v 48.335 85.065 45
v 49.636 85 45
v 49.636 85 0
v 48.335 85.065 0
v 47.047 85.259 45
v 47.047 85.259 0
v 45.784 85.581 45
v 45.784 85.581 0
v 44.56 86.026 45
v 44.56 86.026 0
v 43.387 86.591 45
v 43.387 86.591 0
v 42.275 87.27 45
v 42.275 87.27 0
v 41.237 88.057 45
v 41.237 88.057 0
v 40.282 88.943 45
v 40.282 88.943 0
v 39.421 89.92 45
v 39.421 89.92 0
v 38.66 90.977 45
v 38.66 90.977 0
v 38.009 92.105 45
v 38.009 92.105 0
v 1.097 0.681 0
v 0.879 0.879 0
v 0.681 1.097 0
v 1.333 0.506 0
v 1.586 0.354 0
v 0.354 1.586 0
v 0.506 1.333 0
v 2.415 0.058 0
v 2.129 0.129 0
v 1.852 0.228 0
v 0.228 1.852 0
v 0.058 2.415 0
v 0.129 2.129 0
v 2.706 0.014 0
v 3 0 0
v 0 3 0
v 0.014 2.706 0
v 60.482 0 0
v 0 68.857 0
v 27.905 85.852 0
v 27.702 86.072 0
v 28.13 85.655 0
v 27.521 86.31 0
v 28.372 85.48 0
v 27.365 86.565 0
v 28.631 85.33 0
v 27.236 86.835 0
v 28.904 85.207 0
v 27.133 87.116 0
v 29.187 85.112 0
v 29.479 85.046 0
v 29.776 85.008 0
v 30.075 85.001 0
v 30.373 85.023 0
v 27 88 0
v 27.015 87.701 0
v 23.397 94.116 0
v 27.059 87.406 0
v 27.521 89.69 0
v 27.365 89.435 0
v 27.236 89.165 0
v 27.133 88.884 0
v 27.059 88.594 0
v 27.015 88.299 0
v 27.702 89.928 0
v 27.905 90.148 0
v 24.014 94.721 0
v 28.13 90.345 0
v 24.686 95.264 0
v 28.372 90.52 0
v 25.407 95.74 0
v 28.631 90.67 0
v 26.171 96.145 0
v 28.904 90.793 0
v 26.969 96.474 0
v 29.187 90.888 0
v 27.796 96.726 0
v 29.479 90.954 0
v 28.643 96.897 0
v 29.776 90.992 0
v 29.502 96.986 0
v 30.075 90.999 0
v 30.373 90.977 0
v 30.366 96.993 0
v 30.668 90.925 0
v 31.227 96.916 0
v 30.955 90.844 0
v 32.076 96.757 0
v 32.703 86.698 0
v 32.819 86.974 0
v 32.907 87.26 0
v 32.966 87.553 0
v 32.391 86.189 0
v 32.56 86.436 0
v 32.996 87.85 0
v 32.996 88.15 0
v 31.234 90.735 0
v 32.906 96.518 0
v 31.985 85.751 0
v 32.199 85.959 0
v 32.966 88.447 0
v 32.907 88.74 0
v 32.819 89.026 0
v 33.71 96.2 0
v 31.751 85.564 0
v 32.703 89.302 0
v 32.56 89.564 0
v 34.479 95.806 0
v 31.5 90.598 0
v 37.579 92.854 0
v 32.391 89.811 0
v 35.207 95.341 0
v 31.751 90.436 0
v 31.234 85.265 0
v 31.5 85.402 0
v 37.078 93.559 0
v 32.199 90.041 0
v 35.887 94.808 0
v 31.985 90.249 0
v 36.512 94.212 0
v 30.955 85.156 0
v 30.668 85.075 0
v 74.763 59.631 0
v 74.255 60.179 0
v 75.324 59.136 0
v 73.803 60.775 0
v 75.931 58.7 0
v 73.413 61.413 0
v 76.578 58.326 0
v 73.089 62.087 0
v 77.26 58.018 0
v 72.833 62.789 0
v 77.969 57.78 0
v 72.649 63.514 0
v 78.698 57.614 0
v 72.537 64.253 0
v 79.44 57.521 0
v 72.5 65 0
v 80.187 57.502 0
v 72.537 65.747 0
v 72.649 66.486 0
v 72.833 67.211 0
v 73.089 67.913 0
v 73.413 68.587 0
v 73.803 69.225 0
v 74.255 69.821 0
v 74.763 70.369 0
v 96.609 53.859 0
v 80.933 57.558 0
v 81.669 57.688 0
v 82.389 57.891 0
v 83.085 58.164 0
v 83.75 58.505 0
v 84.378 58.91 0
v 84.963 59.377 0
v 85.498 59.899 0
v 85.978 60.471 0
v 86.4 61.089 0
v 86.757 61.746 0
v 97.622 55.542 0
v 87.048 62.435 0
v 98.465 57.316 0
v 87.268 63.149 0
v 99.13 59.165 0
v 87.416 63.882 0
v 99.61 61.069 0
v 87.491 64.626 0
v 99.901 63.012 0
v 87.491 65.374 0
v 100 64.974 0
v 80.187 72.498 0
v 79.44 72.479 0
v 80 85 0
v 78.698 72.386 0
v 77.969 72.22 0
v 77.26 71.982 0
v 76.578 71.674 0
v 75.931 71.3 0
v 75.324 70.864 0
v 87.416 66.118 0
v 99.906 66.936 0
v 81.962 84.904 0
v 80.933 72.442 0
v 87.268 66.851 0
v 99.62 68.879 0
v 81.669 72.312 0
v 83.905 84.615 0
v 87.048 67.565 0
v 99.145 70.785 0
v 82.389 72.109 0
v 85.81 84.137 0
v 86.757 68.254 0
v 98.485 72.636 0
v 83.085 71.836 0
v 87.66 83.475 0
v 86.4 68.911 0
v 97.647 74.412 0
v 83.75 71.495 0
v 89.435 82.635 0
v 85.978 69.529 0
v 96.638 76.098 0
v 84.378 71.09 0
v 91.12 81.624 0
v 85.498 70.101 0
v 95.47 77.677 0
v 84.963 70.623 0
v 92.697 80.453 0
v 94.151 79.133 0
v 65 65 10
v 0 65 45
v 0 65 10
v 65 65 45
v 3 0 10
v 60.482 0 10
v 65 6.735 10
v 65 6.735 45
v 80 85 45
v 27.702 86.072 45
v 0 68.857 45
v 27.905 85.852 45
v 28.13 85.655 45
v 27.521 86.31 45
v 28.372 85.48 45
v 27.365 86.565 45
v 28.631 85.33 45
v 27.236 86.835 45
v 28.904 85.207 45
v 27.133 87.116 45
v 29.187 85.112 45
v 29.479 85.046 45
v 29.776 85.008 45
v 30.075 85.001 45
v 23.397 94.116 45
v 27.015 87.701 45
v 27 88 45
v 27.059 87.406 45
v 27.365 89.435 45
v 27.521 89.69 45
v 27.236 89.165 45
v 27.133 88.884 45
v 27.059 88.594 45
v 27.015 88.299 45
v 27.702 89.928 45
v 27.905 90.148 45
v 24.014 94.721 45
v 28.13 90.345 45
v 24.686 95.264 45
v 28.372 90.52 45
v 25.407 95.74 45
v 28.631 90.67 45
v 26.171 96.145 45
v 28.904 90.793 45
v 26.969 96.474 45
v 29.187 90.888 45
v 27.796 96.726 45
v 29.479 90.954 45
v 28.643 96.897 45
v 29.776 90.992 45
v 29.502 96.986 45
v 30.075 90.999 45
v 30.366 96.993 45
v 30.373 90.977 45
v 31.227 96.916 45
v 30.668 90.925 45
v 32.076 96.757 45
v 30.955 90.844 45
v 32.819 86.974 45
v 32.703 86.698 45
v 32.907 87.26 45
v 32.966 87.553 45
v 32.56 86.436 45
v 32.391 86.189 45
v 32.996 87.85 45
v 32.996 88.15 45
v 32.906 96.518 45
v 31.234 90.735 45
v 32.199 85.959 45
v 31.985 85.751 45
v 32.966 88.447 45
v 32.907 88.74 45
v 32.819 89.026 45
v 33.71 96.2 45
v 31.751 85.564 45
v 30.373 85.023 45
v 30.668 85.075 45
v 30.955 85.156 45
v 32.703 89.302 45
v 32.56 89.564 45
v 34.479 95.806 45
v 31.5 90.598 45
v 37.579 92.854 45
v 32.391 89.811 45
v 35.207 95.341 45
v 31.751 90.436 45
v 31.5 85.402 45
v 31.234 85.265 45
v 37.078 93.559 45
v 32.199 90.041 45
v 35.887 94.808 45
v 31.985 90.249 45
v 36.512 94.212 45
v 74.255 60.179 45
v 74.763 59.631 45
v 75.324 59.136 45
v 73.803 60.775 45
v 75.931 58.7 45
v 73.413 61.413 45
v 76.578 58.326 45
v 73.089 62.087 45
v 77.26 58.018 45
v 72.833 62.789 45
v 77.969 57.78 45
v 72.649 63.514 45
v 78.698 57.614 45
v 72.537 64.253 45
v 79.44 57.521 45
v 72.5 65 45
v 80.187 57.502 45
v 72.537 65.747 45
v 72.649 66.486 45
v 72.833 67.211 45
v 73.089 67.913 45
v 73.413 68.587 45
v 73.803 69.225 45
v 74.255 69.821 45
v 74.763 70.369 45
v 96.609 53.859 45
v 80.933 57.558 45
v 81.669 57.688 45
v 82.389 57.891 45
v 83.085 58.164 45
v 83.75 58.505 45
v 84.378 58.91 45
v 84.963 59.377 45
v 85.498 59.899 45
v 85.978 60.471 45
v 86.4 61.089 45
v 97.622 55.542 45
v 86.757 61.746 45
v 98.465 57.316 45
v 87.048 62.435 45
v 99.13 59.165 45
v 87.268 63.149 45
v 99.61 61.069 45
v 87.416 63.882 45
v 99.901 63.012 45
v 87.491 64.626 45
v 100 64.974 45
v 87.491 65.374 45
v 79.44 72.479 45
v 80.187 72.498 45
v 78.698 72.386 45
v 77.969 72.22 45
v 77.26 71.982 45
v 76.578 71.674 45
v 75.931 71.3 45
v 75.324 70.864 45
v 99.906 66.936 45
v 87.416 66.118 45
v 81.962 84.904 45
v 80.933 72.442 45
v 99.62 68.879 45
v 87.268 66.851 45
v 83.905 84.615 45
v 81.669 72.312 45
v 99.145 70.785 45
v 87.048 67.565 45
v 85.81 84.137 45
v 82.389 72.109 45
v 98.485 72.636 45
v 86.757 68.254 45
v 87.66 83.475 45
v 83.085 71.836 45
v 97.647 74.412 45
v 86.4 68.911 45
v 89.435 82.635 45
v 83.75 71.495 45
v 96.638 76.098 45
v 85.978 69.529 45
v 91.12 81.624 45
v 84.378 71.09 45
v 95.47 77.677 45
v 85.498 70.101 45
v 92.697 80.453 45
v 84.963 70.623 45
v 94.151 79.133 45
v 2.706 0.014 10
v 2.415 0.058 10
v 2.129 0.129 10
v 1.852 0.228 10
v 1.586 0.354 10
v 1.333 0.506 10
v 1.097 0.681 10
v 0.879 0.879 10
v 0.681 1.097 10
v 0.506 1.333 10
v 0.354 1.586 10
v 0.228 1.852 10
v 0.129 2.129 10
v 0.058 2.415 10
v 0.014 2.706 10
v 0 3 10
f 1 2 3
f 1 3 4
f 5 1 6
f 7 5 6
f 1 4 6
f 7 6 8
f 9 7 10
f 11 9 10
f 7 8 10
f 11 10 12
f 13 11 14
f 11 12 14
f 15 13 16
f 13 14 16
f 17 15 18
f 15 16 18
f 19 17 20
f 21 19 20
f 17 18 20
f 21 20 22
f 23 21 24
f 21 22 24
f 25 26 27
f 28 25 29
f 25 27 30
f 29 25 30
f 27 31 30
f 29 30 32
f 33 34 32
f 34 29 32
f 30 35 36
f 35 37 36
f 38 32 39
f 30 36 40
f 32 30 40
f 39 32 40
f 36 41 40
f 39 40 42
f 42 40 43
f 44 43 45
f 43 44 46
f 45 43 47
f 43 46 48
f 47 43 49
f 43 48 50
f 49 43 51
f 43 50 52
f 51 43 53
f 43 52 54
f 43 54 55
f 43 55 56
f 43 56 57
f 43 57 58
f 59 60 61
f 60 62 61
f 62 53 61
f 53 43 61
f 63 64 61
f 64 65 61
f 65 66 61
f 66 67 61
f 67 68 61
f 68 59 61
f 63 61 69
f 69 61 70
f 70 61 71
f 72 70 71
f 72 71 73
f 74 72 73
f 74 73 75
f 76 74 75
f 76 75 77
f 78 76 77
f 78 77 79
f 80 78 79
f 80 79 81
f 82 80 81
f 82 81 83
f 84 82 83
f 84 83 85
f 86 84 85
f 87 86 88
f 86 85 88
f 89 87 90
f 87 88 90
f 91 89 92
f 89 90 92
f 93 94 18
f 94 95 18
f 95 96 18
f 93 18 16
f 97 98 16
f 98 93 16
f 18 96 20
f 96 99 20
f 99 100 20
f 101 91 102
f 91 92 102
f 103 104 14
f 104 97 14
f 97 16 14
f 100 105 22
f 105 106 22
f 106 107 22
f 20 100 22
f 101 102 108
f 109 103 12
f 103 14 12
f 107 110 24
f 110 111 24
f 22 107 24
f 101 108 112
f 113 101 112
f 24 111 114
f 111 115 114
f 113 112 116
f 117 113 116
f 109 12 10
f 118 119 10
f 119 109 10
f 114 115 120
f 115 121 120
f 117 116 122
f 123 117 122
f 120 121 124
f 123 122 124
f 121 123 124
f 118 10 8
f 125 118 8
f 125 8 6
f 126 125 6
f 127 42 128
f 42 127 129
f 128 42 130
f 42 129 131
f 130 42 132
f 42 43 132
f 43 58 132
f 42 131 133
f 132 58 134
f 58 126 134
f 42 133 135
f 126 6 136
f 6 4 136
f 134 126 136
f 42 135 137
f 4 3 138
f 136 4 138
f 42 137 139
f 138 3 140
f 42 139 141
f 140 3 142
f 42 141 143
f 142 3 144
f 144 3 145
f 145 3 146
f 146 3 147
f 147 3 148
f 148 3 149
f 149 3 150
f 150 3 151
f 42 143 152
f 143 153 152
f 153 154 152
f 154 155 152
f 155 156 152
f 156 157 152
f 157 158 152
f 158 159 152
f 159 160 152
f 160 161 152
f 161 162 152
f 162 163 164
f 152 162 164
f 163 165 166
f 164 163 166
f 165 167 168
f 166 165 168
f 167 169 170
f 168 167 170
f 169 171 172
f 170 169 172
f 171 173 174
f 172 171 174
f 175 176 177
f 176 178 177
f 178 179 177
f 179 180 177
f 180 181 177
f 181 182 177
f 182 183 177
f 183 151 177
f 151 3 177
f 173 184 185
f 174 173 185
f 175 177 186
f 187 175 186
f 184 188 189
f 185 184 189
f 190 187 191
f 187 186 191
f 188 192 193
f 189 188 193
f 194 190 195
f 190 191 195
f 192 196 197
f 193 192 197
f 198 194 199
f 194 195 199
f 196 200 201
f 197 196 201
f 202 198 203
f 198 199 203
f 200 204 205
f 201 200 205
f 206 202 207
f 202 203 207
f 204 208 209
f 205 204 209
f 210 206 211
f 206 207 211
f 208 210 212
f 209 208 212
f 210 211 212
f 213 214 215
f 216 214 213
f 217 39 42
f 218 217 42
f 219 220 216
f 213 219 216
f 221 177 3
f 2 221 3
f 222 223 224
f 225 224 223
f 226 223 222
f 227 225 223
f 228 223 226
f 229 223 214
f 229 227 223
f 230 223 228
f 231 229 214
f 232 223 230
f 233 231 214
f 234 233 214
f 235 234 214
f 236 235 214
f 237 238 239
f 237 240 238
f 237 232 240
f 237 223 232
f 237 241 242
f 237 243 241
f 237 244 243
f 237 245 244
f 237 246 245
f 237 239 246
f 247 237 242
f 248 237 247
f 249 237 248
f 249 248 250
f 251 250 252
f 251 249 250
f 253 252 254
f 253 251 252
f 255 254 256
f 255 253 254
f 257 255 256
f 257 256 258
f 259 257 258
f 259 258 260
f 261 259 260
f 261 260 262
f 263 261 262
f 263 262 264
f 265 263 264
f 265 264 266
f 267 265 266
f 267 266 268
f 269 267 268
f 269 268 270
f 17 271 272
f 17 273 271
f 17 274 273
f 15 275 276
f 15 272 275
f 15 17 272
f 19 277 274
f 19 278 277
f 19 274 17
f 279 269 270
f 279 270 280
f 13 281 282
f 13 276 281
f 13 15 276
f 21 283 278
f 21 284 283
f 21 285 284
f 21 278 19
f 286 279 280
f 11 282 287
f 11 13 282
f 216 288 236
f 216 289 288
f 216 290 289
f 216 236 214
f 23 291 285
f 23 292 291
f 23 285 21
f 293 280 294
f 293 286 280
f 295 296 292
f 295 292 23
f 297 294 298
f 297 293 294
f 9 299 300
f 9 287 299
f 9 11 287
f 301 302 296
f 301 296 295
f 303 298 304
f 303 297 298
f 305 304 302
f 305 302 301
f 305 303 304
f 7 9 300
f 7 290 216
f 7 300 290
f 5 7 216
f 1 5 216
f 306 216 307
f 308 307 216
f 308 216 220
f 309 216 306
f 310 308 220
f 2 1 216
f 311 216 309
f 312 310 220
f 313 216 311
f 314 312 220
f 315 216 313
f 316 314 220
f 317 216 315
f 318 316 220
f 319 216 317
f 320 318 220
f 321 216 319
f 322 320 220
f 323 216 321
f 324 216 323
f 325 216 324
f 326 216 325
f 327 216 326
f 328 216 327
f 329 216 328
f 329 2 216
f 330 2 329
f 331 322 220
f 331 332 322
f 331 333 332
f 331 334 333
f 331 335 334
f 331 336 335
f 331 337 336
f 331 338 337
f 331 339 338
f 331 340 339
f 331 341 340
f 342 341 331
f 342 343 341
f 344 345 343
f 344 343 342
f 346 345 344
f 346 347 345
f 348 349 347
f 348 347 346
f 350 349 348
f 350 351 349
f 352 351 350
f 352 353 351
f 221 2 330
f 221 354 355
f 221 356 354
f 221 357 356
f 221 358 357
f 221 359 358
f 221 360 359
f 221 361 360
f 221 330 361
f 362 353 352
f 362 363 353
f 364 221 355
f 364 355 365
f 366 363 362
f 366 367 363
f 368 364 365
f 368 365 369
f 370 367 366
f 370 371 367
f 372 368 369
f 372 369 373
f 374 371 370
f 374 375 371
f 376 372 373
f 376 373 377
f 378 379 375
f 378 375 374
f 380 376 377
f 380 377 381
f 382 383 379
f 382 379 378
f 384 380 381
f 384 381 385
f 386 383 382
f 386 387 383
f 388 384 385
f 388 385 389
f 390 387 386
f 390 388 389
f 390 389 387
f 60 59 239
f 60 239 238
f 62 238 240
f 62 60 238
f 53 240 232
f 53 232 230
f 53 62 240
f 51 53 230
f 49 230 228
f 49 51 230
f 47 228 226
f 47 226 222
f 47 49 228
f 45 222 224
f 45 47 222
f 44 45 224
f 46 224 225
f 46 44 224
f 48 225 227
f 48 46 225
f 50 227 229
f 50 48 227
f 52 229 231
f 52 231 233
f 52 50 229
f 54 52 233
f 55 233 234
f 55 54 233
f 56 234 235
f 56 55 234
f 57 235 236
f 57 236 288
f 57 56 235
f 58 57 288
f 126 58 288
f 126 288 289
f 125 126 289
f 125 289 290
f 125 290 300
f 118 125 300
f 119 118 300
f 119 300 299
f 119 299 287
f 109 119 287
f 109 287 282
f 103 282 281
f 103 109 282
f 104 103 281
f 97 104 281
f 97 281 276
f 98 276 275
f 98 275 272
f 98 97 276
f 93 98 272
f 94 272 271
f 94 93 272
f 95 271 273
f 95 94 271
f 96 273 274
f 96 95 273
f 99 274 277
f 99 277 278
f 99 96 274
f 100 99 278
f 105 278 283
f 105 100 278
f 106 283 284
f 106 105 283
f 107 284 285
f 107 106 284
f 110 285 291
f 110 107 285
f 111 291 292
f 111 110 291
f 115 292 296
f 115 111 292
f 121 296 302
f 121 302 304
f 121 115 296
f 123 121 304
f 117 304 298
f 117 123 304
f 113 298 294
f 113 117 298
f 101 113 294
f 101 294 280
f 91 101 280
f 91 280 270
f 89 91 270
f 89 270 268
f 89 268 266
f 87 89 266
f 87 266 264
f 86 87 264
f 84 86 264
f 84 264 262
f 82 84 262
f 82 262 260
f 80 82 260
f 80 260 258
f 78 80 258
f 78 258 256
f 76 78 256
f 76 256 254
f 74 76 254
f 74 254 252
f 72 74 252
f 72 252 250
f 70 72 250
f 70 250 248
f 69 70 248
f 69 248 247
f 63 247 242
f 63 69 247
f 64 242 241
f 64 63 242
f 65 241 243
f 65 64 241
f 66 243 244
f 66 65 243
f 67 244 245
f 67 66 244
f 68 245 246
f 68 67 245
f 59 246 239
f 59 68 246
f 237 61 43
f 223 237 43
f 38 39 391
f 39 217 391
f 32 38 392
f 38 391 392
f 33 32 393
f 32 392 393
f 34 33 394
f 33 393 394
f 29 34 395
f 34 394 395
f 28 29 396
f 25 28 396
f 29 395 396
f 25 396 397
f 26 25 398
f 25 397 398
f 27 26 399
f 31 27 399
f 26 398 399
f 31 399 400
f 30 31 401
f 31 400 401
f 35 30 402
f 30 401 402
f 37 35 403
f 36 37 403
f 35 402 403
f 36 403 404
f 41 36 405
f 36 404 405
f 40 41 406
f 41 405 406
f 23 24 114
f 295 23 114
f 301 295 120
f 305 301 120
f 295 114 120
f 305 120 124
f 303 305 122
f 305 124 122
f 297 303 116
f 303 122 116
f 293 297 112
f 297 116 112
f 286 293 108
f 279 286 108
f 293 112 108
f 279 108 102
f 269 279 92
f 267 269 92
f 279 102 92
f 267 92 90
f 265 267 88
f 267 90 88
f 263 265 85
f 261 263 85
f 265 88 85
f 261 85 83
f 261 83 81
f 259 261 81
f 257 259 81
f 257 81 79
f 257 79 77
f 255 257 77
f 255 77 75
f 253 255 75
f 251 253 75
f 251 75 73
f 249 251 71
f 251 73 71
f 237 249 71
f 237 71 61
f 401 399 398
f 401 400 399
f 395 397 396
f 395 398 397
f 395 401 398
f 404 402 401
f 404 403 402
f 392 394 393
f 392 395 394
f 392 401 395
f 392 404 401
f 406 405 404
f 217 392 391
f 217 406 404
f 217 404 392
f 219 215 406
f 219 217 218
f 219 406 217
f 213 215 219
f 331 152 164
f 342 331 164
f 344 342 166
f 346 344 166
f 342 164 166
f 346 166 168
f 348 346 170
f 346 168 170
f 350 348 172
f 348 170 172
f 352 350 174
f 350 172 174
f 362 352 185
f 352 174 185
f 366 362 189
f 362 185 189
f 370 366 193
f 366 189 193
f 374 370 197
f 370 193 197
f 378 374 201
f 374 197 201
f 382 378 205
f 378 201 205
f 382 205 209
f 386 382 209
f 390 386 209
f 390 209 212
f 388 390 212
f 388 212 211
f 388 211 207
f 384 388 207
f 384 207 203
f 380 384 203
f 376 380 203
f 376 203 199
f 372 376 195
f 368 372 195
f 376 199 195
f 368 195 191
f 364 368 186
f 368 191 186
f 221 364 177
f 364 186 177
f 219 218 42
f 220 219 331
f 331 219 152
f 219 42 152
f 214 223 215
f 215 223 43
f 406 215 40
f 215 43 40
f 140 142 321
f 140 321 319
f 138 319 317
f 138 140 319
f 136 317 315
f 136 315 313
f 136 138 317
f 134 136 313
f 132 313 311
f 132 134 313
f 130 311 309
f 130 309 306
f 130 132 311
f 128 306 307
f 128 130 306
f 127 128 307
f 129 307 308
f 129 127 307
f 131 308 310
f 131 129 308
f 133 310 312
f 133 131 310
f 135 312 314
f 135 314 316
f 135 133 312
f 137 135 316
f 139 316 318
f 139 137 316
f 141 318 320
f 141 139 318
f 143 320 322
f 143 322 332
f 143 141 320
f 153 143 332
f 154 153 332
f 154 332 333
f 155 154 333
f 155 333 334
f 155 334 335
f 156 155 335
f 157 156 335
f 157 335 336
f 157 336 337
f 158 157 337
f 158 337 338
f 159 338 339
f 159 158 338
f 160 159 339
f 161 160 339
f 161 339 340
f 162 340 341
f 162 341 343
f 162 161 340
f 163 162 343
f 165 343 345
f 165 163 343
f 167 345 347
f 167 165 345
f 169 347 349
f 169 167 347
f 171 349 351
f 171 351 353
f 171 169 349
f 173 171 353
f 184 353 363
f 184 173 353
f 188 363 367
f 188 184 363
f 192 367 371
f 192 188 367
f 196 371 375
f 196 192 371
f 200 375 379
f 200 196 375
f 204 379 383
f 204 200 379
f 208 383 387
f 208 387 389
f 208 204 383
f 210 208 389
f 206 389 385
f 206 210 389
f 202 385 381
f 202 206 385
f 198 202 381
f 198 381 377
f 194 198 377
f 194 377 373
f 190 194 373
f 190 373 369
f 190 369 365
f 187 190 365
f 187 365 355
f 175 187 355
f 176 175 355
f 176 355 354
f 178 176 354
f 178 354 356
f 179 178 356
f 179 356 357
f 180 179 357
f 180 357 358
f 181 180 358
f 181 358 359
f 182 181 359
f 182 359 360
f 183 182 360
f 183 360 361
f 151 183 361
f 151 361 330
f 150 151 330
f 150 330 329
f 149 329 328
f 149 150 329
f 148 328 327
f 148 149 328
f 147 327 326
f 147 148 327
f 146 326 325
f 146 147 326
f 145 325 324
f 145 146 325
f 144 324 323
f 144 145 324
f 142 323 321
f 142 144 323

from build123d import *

# Parameters (mm, degrees)
SKETCH_1_R          = 3
SKETCH_1_R_2        = 7.5
EXTRUDE_2_DEPTH     = 45
SKETCH_3_W          = 65
SKETCH_3_H          = 65
CUT_EXTRUDE_1_DEPTH = 35
FILLET_1_R          = 3


with BuildPart() as part:
    # ｽｹｯﾁ1 → ﾎﾞｽ - 押し出し2 (new body)
    with BuildSketch(Plane.XY):
        with BuildLine():
            Line((0, 0), (60.482195673, 0))
            Line((60.482195673, 0), (96.609428685, 53.858775707))
            ThreePointArc((96.609428685, 53.858775707), (97.646876294, 74.412106941), (80, 85))
            Line((80, 85), (49.635590302, 85))
            ThreePointArc((49.635590302, 85), (42.822728652, 86.91697026), (38.00913265, 92.105337282))
            ThreePointArc((38.00913265, 92.105337282), (31.226913615, 96.915979081), (23.397413698, 94.116032547))
            Line((23.397413698, 94.116032547), (0, 68.857265202))
            Line((0, 68.857265202), (0, 0))
        make_face()
        with Locations(Location((30, 88, 0), (0, 0, 180))):
            Circle(SKETCH_1_R, mode=Mode.SUBTRACT)
        with Locations(Location((80, 65, 0), (0, 0, 180))):
            Circle(SKETCH_1_R_2, mode=Mode.SUBTRACT)
    extrude(amount=EXTRUDE_2_DEPTH)

    # ｽｹｯﾁ3 → ｶｯﾄ - 押し出し1 (cut)
    with BuildSketch(Plane.XY.offset(45)):
        with Locations((32.5, 32.5)):
            Rectangle(SKETCH_3_W, SKETCH_3_H)
    extrude(amount=-CUT_EXTRUDE_1_DEPTH, mode=Mode.SUBTRACT)

    # ﾌｨﾚｯﾄ1
    fillet_1_edges = [part.edges().sort_by_distance(p)[0] for p in [
        (0, 0, 5),
    ]]
    fillet(fillet_1_edges, radius=FILLET_1_R)


solid = part.part
